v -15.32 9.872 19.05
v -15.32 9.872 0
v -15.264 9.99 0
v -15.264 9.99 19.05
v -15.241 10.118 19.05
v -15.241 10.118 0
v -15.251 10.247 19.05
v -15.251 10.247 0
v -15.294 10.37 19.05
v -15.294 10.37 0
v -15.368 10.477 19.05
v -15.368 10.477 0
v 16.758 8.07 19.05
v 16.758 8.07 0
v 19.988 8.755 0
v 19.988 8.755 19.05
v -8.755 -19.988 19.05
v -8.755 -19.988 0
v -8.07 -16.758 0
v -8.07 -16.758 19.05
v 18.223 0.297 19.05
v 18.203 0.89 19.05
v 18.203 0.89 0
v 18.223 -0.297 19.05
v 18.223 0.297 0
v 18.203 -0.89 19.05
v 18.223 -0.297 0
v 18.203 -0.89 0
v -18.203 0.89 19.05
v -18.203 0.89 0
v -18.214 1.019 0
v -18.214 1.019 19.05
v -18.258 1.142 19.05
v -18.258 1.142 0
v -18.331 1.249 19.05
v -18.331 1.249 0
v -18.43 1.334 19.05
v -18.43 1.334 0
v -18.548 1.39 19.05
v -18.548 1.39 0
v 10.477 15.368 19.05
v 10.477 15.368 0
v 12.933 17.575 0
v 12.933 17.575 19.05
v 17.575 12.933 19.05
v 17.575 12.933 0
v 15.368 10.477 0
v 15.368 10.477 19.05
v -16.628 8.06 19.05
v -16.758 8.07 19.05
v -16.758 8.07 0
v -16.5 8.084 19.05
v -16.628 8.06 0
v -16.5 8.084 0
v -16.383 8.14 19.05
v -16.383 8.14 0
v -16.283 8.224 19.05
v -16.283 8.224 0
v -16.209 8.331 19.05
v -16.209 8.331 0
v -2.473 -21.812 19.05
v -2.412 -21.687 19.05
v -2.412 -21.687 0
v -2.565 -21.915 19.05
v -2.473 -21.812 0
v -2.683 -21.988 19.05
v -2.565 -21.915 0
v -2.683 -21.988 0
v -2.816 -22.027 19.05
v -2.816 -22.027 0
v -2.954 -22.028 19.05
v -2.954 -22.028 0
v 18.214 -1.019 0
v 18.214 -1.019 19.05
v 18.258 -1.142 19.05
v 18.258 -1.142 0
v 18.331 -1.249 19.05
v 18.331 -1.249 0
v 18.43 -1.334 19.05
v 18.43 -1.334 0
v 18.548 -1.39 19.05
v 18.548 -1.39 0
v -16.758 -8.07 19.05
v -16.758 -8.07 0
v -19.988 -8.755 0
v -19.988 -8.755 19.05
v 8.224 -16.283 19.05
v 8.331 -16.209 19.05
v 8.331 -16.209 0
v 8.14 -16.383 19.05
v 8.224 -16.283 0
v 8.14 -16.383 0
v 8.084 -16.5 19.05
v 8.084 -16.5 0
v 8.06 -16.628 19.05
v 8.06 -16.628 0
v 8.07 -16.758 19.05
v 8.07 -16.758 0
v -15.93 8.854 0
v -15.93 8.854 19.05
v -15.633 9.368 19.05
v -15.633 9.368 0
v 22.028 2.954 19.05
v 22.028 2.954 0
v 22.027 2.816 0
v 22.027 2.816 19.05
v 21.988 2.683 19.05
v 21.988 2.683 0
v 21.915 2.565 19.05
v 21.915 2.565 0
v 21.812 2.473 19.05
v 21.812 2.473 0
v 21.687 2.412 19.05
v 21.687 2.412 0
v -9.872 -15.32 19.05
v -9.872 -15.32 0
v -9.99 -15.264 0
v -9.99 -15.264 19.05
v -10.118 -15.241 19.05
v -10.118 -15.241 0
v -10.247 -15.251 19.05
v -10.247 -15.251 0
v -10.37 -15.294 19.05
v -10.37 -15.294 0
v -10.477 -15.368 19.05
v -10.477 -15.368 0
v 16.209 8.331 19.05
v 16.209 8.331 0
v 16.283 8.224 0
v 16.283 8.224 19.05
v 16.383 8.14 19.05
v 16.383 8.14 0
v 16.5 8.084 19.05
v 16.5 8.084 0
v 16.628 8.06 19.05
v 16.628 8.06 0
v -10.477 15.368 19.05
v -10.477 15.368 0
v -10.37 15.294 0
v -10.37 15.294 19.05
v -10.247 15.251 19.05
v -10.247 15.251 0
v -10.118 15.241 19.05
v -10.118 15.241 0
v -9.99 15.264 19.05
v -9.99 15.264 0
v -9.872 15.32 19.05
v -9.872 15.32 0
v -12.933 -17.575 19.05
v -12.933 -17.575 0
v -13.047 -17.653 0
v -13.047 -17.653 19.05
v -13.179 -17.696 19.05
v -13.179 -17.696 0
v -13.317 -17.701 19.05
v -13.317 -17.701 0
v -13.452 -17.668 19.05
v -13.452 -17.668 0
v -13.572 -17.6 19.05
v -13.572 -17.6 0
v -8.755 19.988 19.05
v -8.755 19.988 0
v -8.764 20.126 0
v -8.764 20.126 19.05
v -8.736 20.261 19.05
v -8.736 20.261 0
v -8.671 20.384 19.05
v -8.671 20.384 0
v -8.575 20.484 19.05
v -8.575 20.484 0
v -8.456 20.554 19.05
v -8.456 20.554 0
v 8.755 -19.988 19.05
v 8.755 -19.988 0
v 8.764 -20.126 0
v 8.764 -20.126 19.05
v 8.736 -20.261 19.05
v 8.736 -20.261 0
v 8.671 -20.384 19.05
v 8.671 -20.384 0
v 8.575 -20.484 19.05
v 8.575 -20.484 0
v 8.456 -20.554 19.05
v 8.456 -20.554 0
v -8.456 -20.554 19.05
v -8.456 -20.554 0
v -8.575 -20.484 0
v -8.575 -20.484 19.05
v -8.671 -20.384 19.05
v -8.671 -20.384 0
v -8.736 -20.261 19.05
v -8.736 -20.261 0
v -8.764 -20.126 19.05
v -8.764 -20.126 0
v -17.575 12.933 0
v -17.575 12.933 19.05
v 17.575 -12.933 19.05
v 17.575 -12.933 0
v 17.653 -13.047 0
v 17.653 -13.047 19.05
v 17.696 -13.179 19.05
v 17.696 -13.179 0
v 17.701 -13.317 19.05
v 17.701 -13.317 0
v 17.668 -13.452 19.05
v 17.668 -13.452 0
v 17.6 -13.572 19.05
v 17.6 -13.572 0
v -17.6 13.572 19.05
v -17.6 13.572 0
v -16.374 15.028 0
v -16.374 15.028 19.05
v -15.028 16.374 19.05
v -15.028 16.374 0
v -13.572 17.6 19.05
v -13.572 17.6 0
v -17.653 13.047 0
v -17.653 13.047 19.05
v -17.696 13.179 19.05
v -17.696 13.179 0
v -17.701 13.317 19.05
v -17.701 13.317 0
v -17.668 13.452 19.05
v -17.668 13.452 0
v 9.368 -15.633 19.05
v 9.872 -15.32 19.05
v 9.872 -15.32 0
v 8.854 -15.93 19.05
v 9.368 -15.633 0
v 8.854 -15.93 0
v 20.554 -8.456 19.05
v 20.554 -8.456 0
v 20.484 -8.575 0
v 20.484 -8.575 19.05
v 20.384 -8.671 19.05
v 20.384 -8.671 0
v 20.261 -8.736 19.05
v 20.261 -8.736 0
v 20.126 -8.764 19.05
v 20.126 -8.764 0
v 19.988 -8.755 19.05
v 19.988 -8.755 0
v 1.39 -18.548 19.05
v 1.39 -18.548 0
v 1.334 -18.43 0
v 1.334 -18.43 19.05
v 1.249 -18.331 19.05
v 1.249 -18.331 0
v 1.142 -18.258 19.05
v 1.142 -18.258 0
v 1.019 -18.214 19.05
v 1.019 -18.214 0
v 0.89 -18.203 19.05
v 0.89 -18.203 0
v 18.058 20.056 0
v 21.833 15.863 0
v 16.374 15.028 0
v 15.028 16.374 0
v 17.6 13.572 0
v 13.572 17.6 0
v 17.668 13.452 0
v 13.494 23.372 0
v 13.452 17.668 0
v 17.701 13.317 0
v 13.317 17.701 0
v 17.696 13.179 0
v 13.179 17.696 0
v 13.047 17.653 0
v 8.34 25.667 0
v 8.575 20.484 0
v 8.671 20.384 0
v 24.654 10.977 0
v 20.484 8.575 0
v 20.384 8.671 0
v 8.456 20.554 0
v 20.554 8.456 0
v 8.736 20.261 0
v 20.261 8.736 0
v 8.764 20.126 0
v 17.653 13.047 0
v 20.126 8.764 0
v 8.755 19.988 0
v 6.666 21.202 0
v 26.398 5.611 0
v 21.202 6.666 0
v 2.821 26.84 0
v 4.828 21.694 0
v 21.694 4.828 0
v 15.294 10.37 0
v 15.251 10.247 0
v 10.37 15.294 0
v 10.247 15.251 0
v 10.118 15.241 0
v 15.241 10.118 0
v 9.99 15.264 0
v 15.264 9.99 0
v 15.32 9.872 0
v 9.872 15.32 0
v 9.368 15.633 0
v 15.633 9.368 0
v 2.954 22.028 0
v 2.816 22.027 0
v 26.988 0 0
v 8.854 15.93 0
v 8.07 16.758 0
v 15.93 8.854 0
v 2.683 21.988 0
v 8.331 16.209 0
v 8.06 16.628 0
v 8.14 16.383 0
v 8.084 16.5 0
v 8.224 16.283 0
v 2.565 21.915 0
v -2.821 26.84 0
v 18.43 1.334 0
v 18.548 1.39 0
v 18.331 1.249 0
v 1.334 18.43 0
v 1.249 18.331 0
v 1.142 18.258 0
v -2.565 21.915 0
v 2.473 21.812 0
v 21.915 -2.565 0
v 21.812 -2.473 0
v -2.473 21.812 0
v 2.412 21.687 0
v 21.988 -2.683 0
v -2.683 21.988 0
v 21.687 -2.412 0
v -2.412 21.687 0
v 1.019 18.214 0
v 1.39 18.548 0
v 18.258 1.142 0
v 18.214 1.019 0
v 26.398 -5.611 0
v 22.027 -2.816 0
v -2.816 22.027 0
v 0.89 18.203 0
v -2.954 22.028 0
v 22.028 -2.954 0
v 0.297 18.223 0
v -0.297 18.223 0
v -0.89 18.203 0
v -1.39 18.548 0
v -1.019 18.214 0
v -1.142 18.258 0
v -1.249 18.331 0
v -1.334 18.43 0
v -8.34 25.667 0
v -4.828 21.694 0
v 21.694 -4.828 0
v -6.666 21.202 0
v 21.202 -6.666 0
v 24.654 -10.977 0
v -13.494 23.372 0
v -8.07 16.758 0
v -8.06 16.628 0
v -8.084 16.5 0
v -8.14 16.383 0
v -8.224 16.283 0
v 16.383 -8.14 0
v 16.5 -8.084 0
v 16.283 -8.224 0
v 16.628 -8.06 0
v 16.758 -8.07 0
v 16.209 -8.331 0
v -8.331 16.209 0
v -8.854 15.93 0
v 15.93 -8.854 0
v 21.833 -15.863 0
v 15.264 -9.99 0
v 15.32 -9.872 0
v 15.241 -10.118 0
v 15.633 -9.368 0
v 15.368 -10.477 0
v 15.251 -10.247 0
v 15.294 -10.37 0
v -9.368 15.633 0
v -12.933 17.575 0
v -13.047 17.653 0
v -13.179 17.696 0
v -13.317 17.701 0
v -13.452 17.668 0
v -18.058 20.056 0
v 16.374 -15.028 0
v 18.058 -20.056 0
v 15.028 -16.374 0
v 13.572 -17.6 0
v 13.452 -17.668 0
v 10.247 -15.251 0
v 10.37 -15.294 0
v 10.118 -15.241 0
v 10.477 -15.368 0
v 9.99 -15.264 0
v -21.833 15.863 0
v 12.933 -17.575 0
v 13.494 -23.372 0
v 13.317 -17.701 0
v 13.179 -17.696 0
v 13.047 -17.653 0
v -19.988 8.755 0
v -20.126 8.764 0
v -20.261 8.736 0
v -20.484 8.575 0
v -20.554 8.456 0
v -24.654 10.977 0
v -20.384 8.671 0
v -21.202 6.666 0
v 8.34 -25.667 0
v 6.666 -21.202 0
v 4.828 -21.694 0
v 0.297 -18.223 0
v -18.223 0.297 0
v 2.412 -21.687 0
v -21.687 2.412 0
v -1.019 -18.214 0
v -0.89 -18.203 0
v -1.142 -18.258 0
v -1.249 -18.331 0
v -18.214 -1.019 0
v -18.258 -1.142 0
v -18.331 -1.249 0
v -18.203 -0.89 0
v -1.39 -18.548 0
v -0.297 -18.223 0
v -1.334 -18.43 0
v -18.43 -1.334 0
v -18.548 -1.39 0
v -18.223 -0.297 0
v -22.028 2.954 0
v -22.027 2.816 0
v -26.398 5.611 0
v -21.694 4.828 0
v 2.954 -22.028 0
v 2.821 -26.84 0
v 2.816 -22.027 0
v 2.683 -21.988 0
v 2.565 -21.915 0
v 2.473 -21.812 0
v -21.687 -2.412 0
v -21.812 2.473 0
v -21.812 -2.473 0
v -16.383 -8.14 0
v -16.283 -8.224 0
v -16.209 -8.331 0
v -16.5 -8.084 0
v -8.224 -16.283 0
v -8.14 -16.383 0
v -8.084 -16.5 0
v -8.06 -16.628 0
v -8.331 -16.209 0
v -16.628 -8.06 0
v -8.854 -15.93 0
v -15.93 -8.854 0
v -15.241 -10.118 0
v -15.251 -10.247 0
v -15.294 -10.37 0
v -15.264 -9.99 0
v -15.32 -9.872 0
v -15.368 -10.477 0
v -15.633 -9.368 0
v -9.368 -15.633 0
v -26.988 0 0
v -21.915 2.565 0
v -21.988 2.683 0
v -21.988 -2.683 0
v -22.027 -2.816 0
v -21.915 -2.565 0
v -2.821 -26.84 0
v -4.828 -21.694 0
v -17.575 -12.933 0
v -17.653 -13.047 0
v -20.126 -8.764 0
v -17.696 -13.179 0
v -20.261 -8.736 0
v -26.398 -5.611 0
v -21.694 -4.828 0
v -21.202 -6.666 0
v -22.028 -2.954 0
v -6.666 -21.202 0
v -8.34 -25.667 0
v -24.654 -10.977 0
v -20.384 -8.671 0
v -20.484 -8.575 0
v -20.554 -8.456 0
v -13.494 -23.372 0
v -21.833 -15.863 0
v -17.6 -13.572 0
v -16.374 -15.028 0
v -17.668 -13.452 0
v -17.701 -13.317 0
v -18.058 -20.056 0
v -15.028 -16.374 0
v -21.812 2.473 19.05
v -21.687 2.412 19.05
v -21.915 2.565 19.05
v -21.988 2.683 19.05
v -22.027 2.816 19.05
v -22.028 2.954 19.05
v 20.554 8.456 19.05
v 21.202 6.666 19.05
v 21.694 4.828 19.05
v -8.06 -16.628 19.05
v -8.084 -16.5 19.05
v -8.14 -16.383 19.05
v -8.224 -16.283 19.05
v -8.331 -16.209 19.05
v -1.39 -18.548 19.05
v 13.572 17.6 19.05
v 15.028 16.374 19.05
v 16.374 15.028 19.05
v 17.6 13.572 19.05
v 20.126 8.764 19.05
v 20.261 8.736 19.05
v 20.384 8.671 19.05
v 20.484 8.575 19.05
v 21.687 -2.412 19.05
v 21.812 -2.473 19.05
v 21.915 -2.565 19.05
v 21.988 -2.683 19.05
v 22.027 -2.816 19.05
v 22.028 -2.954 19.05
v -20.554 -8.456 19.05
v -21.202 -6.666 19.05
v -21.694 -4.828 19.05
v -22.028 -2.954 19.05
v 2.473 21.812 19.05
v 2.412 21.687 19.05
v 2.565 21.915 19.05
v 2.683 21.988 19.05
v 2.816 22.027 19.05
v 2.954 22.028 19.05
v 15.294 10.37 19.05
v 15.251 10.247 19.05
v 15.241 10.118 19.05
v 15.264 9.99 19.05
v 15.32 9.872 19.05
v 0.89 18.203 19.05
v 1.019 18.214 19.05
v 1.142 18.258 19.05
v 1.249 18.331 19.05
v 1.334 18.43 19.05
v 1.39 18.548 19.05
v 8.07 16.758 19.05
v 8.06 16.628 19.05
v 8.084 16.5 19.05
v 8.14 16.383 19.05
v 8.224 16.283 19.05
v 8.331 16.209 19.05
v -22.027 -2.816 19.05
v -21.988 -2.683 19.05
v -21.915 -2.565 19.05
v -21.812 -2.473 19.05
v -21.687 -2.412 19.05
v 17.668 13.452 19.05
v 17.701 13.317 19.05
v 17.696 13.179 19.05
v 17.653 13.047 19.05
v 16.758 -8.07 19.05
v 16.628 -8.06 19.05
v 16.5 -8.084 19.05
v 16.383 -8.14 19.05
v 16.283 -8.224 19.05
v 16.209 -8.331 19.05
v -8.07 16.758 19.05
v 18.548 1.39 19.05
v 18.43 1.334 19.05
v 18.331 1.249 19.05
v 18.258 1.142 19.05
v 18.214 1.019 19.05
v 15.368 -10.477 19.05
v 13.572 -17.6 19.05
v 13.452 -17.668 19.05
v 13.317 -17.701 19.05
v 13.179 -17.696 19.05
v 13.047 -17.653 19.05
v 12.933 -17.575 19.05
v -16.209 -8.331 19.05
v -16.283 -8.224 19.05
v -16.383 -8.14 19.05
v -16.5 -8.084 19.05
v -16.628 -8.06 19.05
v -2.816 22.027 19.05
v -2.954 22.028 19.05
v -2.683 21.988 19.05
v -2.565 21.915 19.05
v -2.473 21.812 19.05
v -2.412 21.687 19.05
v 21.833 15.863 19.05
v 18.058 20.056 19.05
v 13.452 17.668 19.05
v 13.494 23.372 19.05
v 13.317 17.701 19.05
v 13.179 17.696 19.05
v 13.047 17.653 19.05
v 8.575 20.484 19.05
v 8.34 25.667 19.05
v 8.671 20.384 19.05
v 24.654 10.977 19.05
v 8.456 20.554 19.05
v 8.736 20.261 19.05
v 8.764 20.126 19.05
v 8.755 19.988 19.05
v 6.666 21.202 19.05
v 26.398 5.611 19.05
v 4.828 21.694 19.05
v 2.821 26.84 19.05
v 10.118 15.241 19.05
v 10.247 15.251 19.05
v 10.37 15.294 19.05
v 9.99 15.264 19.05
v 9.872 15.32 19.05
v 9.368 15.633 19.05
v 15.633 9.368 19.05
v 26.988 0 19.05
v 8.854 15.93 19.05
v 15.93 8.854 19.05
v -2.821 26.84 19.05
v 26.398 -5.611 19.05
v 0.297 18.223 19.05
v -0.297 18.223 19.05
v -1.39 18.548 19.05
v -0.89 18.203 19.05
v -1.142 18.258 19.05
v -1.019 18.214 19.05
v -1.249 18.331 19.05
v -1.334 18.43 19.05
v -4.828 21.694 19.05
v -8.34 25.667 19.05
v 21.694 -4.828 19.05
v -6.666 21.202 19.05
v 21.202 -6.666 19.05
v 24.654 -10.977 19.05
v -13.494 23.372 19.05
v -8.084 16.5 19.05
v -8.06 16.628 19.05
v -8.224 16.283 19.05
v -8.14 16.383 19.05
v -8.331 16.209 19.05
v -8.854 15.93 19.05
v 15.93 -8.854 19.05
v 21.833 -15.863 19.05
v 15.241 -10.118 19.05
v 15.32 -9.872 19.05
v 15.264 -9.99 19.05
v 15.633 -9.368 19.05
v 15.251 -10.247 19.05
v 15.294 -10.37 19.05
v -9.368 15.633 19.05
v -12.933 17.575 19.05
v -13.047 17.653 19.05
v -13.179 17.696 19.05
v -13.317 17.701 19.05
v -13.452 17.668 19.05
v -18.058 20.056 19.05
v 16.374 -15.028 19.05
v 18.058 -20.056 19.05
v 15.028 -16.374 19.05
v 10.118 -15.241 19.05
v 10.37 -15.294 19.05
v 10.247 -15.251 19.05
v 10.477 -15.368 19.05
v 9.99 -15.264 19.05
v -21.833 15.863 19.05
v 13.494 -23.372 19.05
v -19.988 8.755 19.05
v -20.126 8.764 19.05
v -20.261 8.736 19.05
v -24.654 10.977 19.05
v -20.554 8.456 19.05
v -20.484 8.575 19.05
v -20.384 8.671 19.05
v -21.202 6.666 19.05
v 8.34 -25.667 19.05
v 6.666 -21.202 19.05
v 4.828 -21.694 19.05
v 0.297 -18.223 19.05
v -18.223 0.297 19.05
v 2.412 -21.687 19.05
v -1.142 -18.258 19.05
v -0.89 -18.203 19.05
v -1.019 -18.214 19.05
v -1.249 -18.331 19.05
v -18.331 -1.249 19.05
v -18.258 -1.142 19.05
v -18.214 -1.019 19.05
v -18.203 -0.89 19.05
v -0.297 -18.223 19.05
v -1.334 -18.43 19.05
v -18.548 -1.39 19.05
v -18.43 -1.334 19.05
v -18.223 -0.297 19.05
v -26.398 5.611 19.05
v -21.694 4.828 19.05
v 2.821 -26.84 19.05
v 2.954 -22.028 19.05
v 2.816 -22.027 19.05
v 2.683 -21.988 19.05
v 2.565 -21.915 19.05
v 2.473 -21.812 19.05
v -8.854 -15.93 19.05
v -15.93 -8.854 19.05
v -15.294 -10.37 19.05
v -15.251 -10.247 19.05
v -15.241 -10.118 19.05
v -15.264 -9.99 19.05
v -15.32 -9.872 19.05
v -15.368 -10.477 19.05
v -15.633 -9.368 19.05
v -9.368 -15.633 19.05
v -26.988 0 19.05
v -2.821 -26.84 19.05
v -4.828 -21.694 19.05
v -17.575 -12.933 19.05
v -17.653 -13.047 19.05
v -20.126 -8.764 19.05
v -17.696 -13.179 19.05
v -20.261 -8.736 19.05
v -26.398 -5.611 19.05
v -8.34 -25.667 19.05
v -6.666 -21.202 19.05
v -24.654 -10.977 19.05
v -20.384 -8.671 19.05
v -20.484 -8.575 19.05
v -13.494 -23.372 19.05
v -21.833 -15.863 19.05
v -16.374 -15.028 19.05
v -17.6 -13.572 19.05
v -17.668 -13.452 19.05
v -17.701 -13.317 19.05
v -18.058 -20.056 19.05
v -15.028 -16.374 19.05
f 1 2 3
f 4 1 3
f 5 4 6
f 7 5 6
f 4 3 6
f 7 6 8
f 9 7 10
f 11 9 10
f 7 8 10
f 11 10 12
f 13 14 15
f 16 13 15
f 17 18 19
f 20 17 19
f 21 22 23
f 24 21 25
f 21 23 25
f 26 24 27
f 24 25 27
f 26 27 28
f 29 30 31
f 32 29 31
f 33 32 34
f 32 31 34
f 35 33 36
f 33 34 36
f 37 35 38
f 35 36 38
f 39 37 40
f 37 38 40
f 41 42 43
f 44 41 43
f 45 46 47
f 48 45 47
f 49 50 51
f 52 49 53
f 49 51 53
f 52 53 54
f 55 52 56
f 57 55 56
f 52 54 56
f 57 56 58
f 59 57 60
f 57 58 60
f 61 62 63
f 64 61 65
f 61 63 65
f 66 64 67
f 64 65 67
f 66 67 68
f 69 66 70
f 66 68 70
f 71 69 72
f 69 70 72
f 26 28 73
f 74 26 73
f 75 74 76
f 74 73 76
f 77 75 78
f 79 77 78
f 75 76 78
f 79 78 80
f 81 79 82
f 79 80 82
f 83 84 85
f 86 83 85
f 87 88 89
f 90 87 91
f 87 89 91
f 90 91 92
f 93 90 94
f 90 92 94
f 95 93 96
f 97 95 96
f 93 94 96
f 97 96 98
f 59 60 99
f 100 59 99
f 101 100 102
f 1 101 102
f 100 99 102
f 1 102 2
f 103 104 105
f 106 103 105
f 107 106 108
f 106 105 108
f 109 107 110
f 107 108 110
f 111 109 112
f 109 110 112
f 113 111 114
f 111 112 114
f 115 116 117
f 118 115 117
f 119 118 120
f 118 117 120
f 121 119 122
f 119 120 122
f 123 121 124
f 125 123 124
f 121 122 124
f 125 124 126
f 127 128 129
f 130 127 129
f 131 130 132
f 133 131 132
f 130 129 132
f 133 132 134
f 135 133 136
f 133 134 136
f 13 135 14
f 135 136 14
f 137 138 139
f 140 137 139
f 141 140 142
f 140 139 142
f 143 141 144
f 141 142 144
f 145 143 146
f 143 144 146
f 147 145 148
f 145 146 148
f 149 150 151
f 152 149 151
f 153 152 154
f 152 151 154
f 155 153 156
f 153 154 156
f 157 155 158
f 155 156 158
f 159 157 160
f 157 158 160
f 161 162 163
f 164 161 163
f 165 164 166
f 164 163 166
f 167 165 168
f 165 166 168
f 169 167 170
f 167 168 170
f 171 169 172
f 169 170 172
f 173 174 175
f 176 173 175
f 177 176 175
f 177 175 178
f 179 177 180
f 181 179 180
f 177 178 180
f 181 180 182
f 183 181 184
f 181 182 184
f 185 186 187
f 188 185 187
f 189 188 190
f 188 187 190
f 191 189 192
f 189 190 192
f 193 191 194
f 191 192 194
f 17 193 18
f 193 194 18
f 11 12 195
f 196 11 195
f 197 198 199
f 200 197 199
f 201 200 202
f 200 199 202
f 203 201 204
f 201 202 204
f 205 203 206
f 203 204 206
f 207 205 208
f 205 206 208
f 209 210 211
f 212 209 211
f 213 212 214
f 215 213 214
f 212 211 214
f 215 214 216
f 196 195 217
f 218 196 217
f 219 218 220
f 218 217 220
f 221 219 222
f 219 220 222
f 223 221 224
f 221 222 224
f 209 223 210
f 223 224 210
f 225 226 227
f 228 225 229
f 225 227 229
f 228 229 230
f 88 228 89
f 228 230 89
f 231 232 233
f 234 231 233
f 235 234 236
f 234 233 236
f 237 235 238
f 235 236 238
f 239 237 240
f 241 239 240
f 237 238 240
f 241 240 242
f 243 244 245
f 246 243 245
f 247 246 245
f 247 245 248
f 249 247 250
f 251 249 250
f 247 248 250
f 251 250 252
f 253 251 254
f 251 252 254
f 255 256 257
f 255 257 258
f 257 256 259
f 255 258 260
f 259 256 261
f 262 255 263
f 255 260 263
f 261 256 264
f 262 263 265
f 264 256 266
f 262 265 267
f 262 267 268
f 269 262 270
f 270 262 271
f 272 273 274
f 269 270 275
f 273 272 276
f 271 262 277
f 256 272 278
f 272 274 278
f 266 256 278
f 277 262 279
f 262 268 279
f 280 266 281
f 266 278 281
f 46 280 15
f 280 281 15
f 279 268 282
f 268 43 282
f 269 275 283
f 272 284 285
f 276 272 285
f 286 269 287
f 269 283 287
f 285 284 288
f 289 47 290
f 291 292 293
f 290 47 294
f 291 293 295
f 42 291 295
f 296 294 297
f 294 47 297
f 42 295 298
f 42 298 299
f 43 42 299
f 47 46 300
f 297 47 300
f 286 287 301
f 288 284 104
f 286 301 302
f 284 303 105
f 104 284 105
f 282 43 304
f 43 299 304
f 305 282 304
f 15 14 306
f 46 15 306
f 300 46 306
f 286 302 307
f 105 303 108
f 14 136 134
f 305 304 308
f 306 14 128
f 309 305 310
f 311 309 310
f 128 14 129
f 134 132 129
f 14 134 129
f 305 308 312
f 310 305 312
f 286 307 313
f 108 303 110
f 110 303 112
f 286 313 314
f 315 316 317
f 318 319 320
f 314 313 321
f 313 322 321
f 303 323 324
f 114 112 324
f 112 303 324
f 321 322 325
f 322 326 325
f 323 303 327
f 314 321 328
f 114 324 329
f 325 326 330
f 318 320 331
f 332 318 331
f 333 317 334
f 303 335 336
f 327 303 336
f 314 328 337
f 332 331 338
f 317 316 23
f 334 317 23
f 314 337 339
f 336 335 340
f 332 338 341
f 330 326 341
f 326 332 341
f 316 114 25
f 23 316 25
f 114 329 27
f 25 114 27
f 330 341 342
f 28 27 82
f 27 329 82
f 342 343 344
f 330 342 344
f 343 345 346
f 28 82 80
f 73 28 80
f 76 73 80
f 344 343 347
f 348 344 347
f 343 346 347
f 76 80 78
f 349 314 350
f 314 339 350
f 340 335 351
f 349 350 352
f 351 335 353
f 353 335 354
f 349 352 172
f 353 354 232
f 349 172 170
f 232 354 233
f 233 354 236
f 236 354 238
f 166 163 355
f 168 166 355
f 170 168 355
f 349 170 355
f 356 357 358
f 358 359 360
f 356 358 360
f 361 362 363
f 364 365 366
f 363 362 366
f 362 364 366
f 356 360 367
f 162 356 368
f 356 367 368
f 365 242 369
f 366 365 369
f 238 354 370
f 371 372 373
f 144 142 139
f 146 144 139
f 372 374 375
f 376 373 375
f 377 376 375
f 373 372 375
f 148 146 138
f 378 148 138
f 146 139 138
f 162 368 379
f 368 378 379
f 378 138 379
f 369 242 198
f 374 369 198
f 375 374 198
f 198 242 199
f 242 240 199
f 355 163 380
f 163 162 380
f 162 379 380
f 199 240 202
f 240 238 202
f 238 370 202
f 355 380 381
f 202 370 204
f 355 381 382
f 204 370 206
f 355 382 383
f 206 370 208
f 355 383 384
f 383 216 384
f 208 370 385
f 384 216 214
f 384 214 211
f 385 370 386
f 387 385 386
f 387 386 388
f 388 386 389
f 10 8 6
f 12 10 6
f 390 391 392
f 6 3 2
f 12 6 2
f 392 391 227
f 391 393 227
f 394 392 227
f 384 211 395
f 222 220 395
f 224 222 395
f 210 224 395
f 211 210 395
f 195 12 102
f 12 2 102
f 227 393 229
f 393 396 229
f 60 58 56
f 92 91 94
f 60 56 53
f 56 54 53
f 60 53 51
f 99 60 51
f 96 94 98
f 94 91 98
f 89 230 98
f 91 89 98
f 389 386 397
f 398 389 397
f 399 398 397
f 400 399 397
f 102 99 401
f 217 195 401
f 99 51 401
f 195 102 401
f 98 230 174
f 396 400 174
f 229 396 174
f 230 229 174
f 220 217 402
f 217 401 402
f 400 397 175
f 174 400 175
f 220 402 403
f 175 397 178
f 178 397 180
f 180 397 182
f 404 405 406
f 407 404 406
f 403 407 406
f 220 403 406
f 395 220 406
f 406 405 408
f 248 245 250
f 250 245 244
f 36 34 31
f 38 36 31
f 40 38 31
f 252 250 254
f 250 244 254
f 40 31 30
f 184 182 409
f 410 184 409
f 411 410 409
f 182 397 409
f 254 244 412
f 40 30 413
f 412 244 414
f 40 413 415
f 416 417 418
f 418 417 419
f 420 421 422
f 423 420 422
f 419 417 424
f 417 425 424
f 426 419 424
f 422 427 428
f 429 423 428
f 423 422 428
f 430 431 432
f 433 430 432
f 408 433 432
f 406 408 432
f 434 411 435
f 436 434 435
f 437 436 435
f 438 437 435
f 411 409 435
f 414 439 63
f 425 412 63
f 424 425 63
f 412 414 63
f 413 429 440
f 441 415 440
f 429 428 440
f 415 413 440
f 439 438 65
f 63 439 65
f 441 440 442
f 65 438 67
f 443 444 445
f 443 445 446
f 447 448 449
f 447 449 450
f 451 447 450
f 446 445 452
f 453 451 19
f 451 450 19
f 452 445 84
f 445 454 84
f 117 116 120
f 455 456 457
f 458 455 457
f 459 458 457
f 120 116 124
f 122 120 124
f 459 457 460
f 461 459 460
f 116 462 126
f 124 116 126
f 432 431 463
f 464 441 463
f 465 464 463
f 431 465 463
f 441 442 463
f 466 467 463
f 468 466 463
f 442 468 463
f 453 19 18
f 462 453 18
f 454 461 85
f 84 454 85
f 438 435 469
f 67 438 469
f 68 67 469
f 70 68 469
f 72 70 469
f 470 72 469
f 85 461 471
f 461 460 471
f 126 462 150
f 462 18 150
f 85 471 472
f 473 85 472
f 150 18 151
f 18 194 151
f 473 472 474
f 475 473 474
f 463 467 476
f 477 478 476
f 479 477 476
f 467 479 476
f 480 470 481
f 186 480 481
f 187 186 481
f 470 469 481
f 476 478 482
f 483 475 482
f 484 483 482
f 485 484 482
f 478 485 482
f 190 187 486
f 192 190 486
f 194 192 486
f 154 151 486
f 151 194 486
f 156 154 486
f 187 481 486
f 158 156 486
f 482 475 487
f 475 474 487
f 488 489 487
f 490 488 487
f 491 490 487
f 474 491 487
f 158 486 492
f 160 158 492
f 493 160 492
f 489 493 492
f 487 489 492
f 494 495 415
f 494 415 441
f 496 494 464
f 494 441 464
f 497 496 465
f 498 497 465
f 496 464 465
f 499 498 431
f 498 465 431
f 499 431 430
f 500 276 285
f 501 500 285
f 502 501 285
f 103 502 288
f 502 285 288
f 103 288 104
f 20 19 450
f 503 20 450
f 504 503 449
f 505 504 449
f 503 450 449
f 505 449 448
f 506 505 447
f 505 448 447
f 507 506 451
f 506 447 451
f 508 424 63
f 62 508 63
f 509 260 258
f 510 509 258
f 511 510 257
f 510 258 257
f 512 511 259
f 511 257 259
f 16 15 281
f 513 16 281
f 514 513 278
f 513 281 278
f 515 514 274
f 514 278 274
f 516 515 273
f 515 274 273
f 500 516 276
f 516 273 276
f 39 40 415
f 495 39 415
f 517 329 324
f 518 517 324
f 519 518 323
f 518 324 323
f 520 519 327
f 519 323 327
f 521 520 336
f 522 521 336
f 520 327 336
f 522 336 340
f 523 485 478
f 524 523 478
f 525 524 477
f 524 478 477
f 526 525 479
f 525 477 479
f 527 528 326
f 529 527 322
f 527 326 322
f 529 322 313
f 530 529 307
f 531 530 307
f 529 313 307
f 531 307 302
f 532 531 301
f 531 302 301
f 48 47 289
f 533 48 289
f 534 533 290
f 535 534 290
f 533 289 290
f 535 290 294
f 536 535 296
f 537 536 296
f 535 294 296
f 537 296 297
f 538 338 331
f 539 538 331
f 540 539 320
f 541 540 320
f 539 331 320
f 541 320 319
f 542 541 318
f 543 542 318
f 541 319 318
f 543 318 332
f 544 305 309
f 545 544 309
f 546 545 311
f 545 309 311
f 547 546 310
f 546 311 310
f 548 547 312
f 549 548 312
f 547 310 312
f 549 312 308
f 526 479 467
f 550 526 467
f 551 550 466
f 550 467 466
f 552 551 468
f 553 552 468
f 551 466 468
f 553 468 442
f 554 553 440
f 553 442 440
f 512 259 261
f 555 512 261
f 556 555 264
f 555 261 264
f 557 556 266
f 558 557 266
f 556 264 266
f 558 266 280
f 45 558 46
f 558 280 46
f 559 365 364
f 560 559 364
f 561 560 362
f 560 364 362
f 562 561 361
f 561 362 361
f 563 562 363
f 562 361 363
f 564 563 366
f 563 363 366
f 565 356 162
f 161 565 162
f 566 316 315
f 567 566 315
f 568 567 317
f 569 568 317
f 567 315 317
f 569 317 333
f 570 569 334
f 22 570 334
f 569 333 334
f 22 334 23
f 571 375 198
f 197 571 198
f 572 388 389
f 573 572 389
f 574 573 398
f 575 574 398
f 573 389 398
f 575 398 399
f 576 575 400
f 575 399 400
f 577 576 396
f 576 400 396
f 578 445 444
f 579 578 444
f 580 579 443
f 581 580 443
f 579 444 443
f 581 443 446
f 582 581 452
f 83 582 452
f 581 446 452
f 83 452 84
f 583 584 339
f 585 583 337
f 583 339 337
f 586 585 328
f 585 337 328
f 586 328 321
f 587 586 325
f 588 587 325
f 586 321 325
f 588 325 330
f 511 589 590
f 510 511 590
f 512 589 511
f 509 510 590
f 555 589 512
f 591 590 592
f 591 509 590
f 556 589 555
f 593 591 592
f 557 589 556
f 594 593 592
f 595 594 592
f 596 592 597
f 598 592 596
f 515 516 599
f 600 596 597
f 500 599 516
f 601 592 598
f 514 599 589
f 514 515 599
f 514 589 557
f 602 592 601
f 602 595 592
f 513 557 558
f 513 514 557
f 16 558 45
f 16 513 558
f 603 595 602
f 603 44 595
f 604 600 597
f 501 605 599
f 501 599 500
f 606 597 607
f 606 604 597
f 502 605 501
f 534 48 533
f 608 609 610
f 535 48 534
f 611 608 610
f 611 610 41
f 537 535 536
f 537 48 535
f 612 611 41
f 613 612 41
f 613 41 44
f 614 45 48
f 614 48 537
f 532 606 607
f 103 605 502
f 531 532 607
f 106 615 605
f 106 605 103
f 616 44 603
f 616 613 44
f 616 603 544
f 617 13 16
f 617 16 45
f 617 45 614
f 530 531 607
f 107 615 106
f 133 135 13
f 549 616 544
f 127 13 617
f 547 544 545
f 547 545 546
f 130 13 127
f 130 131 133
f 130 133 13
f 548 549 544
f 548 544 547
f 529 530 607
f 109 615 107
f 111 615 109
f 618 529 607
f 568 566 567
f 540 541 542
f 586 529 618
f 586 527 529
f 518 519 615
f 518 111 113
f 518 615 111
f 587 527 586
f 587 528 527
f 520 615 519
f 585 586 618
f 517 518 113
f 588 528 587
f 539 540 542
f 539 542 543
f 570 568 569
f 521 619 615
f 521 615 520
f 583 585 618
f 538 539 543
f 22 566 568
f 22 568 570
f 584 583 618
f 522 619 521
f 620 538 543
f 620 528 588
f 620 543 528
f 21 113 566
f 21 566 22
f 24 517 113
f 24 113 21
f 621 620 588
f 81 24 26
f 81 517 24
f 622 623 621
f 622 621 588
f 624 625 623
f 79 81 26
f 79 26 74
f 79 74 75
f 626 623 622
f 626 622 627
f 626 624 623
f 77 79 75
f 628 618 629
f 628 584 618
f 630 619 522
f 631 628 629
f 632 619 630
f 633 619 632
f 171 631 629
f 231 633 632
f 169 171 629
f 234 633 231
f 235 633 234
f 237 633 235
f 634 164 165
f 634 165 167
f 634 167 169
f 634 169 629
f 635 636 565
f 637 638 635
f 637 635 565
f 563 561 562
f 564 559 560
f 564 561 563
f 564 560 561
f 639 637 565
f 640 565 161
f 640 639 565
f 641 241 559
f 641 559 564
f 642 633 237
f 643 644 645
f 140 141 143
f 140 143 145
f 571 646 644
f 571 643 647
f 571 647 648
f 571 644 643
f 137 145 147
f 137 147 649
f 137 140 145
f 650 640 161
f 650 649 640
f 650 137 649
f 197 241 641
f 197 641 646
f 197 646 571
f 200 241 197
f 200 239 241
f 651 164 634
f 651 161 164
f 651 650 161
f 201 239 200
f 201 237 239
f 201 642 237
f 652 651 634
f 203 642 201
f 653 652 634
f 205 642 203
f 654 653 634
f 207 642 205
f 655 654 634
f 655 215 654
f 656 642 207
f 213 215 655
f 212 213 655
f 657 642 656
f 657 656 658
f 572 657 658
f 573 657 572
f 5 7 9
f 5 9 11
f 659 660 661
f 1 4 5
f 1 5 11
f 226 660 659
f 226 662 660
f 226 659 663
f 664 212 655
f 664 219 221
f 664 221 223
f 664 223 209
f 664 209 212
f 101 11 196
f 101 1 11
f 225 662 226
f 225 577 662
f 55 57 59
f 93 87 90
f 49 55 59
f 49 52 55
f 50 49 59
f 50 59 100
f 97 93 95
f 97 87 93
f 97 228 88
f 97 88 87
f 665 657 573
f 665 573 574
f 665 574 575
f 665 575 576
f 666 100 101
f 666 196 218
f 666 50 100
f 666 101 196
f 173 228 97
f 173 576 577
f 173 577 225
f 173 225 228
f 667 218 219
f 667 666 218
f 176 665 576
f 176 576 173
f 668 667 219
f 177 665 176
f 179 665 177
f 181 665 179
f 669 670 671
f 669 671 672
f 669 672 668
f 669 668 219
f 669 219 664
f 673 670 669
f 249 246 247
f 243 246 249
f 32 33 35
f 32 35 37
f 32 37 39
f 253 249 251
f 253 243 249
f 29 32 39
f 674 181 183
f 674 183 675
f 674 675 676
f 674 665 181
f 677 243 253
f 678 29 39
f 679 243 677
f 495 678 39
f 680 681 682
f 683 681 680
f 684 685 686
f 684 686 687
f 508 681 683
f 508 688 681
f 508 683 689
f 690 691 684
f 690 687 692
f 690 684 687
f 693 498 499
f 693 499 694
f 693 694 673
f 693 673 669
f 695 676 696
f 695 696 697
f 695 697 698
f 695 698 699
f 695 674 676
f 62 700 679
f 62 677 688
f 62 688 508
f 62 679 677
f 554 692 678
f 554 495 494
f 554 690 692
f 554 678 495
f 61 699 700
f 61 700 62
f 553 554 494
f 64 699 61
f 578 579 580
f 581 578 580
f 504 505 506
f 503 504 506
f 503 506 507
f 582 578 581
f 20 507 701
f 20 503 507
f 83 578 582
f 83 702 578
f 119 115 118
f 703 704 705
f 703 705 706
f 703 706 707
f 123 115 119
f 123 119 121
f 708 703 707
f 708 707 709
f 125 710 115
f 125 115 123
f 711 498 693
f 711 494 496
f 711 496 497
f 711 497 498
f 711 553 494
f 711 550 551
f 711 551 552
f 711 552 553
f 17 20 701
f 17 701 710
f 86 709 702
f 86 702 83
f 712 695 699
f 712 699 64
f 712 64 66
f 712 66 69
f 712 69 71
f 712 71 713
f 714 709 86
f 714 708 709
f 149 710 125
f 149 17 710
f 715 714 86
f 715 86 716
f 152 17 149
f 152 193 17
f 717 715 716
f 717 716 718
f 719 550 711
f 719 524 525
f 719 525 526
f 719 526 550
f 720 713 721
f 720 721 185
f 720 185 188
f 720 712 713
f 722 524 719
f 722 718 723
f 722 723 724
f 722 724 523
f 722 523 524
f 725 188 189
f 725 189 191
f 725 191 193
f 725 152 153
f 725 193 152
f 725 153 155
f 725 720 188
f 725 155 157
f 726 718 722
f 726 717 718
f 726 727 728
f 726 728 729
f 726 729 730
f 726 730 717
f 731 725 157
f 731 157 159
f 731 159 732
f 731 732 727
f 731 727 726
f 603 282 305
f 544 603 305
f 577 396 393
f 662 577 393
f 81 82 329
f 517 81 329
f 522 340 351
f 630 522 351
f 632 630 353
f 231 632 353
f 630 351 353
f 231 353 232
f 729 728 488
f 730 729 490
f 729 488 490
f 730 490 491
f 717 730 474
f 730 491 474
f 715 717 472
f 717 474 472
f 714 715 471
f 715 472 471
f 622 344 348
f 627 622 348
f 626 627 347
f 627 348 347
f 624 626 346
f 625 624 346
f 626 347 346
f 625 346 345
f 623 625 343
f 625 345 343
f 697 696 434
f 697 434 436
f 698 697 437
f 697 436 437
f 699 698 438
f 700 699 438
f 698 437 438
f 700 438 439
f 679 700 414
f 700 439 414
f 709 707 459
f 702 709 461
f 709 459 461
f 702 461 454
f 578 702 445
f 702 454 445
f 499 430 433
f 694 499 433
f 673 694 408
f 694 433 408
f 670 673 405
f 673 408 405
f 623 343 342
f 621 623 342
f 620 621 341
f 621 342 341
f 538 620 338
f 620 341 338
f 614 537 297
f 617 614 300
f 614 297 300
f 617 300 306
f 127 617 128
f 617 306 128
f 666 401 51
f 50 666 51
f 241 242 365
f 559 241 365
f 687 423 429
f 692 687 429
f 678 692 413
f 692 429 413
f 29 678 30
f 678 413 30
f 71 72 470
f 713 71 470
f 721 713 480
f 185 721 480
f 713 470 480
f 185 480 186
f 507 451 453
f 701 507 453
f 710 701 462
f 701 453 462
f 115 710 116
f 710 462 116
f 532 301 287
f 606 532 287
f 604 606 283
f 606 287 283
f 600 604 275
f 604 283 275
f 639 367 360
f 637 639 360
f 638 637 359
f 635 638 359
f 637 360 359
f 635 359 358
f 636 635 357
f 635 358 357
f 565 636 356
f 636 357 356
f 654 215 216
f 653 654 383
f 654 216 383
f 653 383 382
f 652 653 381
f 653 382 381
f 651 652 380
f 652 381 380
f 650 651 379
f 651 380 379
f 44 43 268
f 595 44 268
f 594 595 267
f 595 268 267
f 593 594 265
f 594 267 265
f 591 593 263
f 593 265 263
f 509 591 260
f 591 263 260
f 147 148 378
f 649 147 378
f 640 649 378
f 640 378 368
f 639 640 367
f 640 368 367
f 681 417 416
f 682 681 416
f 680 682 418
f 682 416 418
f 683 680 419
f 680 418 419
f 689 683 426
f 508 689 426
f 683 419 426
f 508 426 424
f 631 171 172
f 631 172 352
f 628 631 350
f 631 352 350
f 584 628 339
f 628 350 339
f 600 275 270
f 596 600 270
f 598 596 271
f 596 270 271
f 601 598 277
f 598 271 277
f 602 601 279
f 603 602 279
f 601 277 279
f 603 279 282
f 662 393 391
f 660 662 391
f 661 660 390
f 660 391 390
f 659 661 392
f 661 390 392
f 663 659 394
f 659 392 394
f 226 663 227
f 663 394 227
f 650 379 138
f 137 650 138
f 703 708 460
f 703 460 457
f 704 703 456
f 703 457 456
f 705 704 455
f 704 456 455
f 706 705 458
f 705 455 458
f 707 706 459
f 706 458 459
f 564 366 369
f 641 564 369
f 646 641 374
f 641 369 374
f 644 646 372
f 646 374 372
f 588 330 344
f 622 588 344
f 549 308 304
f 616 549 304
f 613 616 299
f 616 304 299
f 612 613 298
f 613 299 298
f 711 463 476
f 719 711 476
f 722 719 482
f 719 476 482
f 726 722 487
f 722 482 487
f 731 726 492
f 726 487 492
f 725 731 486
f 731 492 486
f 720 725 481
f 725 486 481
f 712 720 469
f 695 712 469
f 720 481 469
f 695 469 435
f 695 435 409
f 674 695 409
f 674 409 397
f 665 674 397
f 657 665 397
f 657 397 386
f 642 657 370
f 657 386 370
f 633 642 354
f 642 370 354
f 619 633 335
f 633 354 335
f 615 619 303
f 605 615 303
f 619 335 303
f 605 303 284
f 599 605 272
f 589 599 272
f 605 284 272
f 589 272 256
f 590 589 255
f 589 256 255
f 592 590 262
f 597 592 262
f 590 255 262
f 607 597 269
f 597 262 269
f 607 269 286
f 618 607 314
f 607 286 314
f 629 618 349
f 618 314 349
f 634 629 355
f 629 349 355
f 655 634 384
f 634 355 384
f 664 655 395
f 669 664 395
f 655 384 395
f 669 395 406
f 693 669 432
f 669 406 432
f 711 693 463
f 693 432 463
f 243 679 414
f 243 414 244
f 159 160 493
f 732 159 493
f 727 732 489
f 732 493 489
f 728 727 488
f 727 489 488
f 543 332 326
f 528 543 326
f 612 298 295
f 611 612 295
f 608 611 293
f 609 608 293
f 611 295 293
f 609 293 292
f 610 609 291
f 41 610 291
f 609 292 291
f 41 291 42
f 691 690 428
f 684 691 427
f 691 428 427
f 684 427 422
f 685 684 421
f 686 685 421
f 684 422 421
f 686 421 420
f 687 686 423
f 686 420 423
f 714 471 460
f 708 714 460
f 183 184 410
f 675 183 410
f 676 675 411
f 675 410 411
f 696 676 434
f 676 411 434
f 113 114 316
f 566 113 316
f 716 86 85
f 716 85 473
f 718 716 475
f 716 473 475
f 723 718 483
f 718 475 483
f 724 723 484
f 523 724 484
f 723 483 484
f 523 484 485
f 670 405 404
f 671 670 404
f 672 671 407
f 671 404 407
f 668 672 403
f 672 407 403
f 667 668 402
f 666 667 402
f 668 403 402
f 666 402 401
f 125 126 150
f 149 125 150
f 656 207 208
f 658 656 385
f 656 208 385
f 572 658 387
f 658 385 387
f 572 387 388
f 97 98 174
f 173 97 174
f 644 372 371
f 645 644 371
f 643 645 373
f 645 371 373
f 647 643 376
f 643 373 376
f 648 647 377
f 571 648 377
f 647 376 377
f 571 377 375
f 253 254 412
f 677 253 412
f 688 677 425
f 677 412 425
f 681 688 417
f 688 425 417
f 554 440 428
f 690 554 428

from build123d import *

# Parameters (mm, degrees)
MODEL_R             = 26.9875
BOSS_EXTRUDE1_DEPTH = 19.05


with BuildPart() as part:
    # Model → Boss-Extrude1 (new body)
    with BuildSketch(Plane.XY):
        with Locations(Location((0, 0, 0), (0, 0, 180))):
            Circle(MODEL_R)
        with BuildLine():
            Line((-8.070485832, 16.757663602), (-8.754511726, 19.987689799))
            ThreePointArc((-8.754511726, 19.987689799), (-8.707484905, 20.324784918), (-8.455586843, 20.553677922))
            ThreePointArc((-8.455586843, 20.553677922), (-5.752253282, 21.467701488), (-2.95408596, 22.027800642))
            ThreePointArc((-2.95408596, 22.027800642), (-2.621489336, 21.955522516), (-2.412215355, 21.687102989))
            Line((-2.412215355, 21.687102989), (-1.38958606, 18.5478053))
            ThreePointArc((-1.38958606, 18.5478053), (-1.197947162, 18.291000428), (-0.889763559, 18.203267447))
            ThreePointArc((-0.889763559, 18.203267447), (-4e-09, 18.224999999), (0.88976355, 18.203267448))
            ThreePointArc((0.88976355, 18.203267448), (1.197947153, 18.291000429), (1.38958605, 18.547805301))
            Line((1.38958605, 18.547805301), (2.412215346, 21.68710299))
            ThreePointArc((2.412215346, 21.68710299), (2.621489327, 21.955522516), (2.954085951, 22.027800641))
            ThreePointArc((2.954085951, 22.027800641), (5.752253273, 21.467701488), (8.455586835, 20.553677923))
            ThreePointArc((8.455586835, 20.553677923), (8.707484897, 20.324784919), (8.754511717, 19.9876898))
            Line((8.754511717, 19.9876898), (8.070485823, 16.757663603))
            ThreePointArc((8.070485823, 16.757663603), (8.108047539, 16.439444611), (8.331075878, 16.209373819))
            ThreePointArc((8.331075878, 16.209373819), (9.112499995, 15.783312983), (9.872191562, 15.319610264))
            ThreePointArc((9.872191562, 15.319610264), (10.182952881, 15.241497453), (10.47731947, 15.368077548))
            Line((10.47731947, 15.368077548), (12.932591265, 17.575474446))
            ThreePointArc((12.932591265, 17.575474446), (13.248037611, 17.703295585), (13.572213798, 17.599591967))
            ThreePointArc((13.572213798, 17.599591967), (15.715448207, 15.71544821), (17.599591964, 13.572213802))
            ThreePointArc((17.599591964, 13.572213802), (17.703295582, 13.248037614), (17.575474443, 12.932591268))
            Line((17.575474443, 12.932591268), (15.368077544, 10.477319473))
            ThreePointArc((15.368077544, 10.477319473), (15.24149745, 10.182952884), (15.319610261, 9.872191565))
            ThreePointArc((15.319610261, 9.872191565), (15.78331298, 9.112499998), (16.209373816, 8.331075881))
            ThreePointArc((16.209373816, 8.331075881), (16.439444608, 8.108047543), (16.7576636, 8.070485826))
            Line((16.7576636, 8.070485826), (19.987689797, 8.75451172))
            ThreePointArc((19.987689797, 8.75451172), (20.324784916, 8.707484899), (20.55367792, 8.455586837))
            ThreePointArc((20.55367792, 8.455586837), (21.467701485, 5.752253275), (22.027800638, 2.954085954))
            ThreePointArc((22.027800638, 2.954085954), (21.955522513, 2.62148933), (21.687102986, 2.412215349))
            Line((21.687102986, 2.412215349), (18.547805297, 1.389586053))
            ThreePointArc((18.547805297, 1.389586053), (18.291000425, 1.197947156), (18.203267445, 0.889763553))
            ThreePointArc((18.203267445, 0.889763553), (18.224999996, -2e-09), (18.203267445, -0.889763556))
            ThreePointArc((18.203267445, -0.889763556), (18.291000425, -1.19794716), (18.547805298, -1.389586057))
            Line((18.547805298, -1.389586057), (21.687102987, -2.412215353))
            ThreePointArc((21.687102987, -2.412215353), (21.955522514, -2.621489333), (22.027800639, -2.954085957))
            ThreePointArc((22.027800639, -2.954085957), (21.467701485, -5.752253279), (20.55367792, -8.455586841))
            ThreePointArc((20.55367792, -8.455586841), (20.324784915, -8.707484903), (19.987689796, -8.754511723))
            Line((19.987689796, -8.754511723), (16.757663599, -8.070485829))
            ThreePointArc((16.757663599, -8.070485829), (16.439444608, -8.108047546), (16.209373816, -8.331075885))
            ThreePointArc((16.209373816, -8.331075885), (15.78331298, -9.112500002), (15.319610261, -9.872191568))
            ThreePointArc((15.319610261, -9.872191568), (15.24149745, -10.182952888), (15.368077545, -10.477319476))
            Line((15.368077545, -10.477319476), (17.575474443, -12.932591272))
            ThreePointArc((17.575474443, -12.932591272), (17.703295583, -13.248037618), (17.599591965, -13.572213805))
            ThreePointArc((17.599591965, -13.572213805), (15.715448207, -15.715448213), (13.572213799, -17.59959197))
            ThreePointArc((13.572213799, -17.59959197), (13.248037611, -17.703295588), (12.932591265, -17.575474449))
            Line((12.932591265, -17.575474449), (10.47731947, -15.368077551))
            ThreePointArc((10.47731947, -15.368077551), (10.182952881, -15.241497457), (9.872191562, -15.319610268))
            ThreePointArc((9.872191562, -15.319610268), (9.112499996, -15.783312986), (8.331075878, -16.209373822))
            ThreePointArc((8.331075878, -16.209373822), (8.108047539, -16.439444614), (8.070485823, -16.757663607))
            Line((8.070485823, -16.757663607), (8.754511717, -19.987689803))
            ThreePointArc((8.754511717, -19.987689803), (8.707484897, -20.324784922), (8.455586834, -20.553677926))
            ThreePointArc((8.455586834, -20.553677926), (5.752253273, -21.467701491), (2.954085951, -22.027800644))
            ThreePointArc((2.954085951, -22.027800644), (2.621489325, -21.955522517), (2.412215346, -21.687102985))
            Line((2.412215346, -21.687102985), (1.38958605, -18.547805297))
            ThreePointArc((1.38958605, -18.547805297), (1.197947153, -18.291000425), (0.889763549, -18.203267444))
            ThreePointArc((0.889763549, -18.203267444), (-4e-09, -18.224999995), (-0.889763558, -18.203267444))
            ThreePointArc((-0.889763558, -18.203267444), (-1.197947162, -18.291000425), (-1.389586059, -18.547805297))
            Line((-1.389586059, -18.547805297), (-2.412215354, -21.687102986))
            ThreePointArc((-2.412215354, -21.687102986), (-2.621489335, -21.955522513), (-2.954085959, -22.027800639))
            ThreePointArc((-2.954085959, -22.027800639), (-5.75225328, -21.467701485), (-8.455586841, -20.55367792))
            ThreePointArc((-8.455586841, -20.55367792), (-8.707484903, -20.324784915), (-8.754511723, -19.987689797))
            Line((-8.754511723, -19.987689797), (-8.070485829, -16.7576636))
            ThreePointArc((-8.070485829, -16.7576636), (-8.108047546, -16.439444608), (-8.331075884, -16.209373816))
            ThreePointArc((-8.331075884, -16.209373816), (-9.112500001, -15.78331298), (-9.872191567, -15.319610262))
            ThreePointArc((-9.872191567, -15.319610262), (-10.182952886, -15.241497451), (-10.477319475, -15.368077546))
            Line((-10.477319475, -15.368077546), (-12.93259127, -17.575474444))
            ThreePointArc((-12.93259127, -17.575474444), (-13.248037616, -17.703295583), (-13.572213803, -17.599591965))
            ThreePointArc((-13.572213803, -17.599591965), (-15.715448211, -15.715448209), (-17.599591967, -13.572213801))
            ThreePointArc((-17.599591967, -13.572213801), (-17.703295585, -13.248037614), (-17.575474446, -12.932591267))
            Line((-17.575474446, -12.932591267), (-15.368077548, -10.477319472))
            ThreePointArc((-15.368077548, -10.477319472), (-15.241497453, -10.182952883), (-15.319610265, -9.872191564))
            ThreePointArc((-15.319610265, -9.872191564), (-15.783312983, -9.112499999), (-16.209373818, -8.331075882))
            ThreePointArc((-16.209373818, -8.331075882), (-16.439444611, -8.108047543), (-16.757663603, -8.070485827))
            Line((-16.757663603, -8.070485827), (-19.9876898, -8.754511721))
            ThreePointArc((-19.9876898, -8.754511721), (-20.324784919, -8.7074849), (-20.553677923, -8.455586838))
            ThreePointArc((-20.553677923, -8.455586838), (-21.467701487, -5.752253277), (-22.027800641, -2.954085957))
            ThreePointArc((-22.027800641, -2.954085957), (-21.955522516, -2.621489333), (-21.687102989, -2.412215352))
            Line((-21.687102989, -2.412215352), (-18.5478053, -1.389586056))
            ThreePointArc((-18.5478053, -1.389586056), (-18.291000428, -1.197947159), (-18.203267448, -0.889763556))
            ThreePointArc((-18.203267448, -0.889763556), (-18.224999999, -2e-09), (-18.203267448, 0.889763552))
            ThreePointArc((-18.203267448, 0.889763552), (-18.291000429, 1.197947155), (-18.547805301, 1.389586052))
            Line((-18.547805301, 1.389586052), (-21.68710299, 2.412215348))
            ThreePointArc((-21.68710299, 2.412215348), (-21.955522518, 2.621489329), (-22.027800643, 2.954085953))
            ThreePointArc((-22.027800643, 2.954085953), (-21.46770149, 5.752253274), (-20.553677925, 8.455586836))
            ThreePointArc((-20.553677925, 8.455586836), (-20.324784921, 8.707484898), (-19.987689802, 8.754511718))
            Line((-19.987689802, 8.754511718), (-16.757663605, 8.070485824))
            ThreePointArc((-16.757663605, 8.070485824), (-16.439444614, 8.108047541), (-16.209373822, 8.331075879))
            ThreePointArc((-16.209373822, 8.331075879), (-15.783312986, 9.112499997), (-15.319610268, 9.872191563))
            ThreePointArc((-15.319610268, 9.872191563), (-15.241497457, 10.182952882), (-15.368077552, 10.477319471))
            Line((-15.368077552, 10.477319471), (-17.57547445, 12.932591266))
            ThreePointArc((-17.57547445, 12.932591266), (-17.703295589, 13.248037612), (-17.599591971, 13.572213799))
            ThreePointArc((-17.599591971, 13.572213799), (-15.715448215, 15.715448208), (-13.572213807, 17.599591965))
            ThreePointArc((-13.572213807, 17.599591965), (-13.24803762, 17.703295583), (-12.932591273, 17.575474444))
            Line((-12.932591273, 17.575474444), (-10.477319478, 15.368077546))
            ThreePointArc((-10.477319478, 15.368077546), (-10.182952889, 15.241497452), (-9.87219157, 15.319610263))
            ThreePointArc((-9.87219157, 15.319610263), (-9.112500004, 15.783312982), (-8.331075887, 16.209373818))
            ThreePointArc((-8.331075887, 16.209373818), (-8.108047548, 16.43944461), (-8.070485832, 16.757663602))
        make_face(mode=Mode.SUBTRACT)
    extrude(amount=BOSS_EXTRUDE1_DEPTH)


solid = part.part
